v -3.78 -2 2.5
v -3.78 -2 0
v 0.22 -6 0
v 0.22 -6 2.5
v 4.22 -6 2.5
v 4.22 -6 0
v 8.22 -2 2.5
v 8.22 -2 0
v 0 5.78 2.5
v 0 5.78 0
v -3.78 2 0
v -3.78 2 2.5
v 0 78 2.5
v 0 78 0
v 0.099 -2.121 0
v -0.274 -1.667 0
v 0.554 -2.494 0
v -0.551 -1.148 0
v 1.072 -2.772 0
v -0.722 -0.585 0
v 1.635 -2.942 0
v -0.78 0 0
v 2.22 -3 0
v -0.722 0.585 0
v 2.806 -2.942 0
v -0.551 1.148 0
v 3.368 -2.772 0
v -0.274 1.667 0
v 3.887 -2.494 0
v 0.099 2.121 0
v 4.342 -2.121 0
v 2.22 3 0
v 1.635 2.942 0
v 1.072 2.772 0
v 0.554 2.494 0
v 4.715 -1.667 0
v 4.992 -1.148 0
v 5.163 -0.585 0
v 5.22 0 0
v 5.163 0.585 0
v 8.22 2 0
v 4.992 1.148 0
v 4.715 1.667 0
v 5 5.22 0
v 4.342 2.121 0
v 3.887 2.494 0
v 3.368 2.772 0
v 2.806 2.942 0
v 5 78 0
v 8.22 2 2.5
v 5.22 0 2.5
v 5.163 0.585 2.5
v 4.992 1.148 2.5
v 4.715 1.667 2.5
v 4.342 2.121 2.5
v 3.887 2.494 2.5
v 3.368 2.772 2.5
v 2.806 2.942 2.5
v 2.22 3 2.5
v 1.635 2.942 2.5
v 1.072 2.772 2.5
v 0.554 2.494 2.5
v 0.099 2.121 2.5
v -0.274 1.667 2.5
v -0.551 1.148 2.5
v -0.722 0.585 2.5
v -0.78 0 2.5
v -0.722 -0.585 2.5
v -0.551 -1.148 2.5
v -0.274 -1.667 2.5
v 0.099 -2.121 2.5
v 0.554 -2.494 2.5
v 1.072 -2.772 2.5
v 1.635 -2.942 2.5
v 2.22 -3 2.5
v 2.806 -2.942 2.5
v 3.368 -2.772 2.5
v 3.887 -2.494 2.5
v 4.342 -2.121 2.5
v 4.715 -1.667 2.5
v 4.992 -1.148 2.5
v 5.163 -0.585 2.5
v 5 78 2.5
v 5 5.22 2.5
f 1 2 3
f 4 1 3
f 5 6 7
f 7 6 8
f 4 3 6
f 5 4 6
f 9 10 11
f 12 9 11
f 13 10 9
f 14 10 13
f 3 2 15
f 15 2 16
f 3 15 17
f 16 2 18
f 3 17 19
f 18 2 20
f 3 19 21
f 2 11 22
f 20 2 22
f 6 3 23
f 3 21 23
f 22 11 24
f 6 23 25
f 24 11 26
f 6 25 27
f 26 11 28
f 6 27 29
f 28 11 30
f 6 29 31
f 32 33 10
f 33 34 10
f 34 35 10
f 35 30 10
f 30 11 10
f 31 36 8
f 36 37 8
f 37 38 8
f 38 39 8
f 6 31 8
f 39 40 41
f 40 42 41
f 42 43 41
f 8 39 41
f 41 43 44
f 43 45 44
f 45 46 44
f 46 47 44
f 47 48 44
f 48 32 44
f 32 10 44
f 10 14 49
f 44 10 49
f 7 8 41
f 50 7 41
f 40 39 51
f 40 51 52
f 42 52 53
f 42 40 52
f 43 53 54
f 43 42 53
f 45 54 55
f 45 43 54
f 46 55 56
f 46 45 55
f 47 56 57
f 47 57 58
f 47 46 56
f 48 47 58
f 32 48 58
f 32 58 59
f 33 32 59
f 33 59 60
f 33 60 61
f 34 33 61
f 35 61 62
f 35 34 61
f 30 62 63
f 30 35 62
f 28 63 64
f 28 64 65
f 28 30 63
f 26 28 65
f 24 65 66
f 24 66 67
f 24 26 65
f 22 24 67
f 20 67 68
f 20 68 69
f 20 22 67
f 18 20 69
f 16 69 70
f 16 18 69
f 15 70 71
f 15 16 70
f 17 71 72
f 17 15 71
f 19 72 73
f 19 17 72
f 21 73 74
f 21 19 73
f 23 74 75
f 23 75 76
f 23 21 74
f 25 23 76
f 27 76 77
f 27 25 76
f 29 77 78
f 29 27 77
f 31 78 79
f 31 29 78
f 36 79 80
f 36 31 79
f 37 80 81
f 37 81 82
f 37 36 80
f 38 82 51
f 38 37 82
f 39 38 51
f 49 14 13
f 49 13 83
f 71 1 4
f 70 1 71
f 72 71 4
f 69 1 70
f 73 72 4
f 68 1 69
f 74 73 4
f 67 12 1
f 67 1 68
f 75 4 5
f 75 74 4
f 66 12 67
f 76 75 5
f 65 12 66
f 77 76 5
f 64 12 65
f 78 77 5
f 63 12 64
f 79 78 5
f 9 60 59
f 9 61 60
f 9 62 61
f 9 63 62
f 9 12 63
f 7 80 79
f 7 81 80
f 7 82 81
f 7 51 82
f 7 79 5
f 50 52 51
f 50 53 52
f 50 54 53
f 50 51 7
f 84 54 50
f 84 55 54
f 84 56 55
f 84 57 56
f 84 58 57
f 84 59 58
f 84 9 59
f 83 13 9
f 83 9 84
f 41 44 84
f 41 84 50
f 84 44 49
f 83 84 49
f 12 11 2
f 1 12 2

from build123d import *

# Parameters (mm, degrees)
F0_R         = 3
F0_W         = 5
F0_H         = 72
F1_DEPTH     = 2.5
F2_T1_DEPTH  = 23.0734639037
F2_T6_DEPTH  = 23.0734639037
F2_T11_DEPTH = 23.0734639037


# Not quite as in the source:
# - a fillet or chamfer that OpenCascade refuses, or shapes differently, is made with other operations: its cross-section is extruded or revolved along the edge and cut away or added


with BuildPart() as f1:
    # F0 (on Top) → F1 (new body)
    with BuildSketch(Plane.XY):
        Polygon((5, 6), (0, 6), (-3.7796038147, 6), (-3.7796038147, -6), (8.2203961853, -6), (8.2203961853, 6), align=None)
        with Locations((2.2203961853, 0)):
            Circle(F0_R, mode=Mode.SUBTRACT)
        with Locations((2.5, 42)):
            Rectangle(F0_W, F0_H)
    extrude(amount=F1_DEPTH)

    # F2: chamfer of 4 on 4 edges, made by hand

    # F2_s2 → F2_t1 (cut)
    with BuildSketch(Plane.XY.offset(-10.2867319519)):
        Polygon((4.2203961853, -6), (8.2203961853, -2), (8.2203961853, -6), align=None)
        Polygon((-3.7796038147, -2), (0.2203961853, -6), (-3.7796038147, -6), align=None)
    extrude(amount=F2_T1_DEPTH, mode=Mode.SUBTRACT)


with BuildPart() as f2_tool4:
    # F2_s5 → F2_t6 (new body)
    with BuildSketch(Plane.XY.offset(-10.2867319519)):
        Polygon((0.2203961853, 6), (-3.7796038147, 2), (-3.7796038147, 6), align=None)
    extrude(amount=F2_T6_DEPTH)

    split(bisect_by=Plane.YZ, keep=Keep.BOTTOM)


with BuildPart() as f1_1:
    add(f1.part)

    # F2_t3: cut F2_tool4
    add(f2_tool4.part, mode=Mode.SUBTRACT)


with BuildPart() as f2_tool9:
    # F2_s10 → F2_t11 (new body)
    with BuildSketch(Plane.XY.offset(-10.2867319519)):
        Polygon((4.2203961853, 6), (8.2203961853, 2), (8.2203961853, 6), align=None)
    extrude(amount=F2_T11_DEPTH)

    split(bisect_by=Plane.YZ.offset(5), keep=Keep.TOP)


with BuildPart() as f1_2:
    add(f1_1.part)

    # F2_t8: cut F2_tool9
    add(f2_tool9.part, mode=Mode.SUBTRACT)


solid = f1_2.part
